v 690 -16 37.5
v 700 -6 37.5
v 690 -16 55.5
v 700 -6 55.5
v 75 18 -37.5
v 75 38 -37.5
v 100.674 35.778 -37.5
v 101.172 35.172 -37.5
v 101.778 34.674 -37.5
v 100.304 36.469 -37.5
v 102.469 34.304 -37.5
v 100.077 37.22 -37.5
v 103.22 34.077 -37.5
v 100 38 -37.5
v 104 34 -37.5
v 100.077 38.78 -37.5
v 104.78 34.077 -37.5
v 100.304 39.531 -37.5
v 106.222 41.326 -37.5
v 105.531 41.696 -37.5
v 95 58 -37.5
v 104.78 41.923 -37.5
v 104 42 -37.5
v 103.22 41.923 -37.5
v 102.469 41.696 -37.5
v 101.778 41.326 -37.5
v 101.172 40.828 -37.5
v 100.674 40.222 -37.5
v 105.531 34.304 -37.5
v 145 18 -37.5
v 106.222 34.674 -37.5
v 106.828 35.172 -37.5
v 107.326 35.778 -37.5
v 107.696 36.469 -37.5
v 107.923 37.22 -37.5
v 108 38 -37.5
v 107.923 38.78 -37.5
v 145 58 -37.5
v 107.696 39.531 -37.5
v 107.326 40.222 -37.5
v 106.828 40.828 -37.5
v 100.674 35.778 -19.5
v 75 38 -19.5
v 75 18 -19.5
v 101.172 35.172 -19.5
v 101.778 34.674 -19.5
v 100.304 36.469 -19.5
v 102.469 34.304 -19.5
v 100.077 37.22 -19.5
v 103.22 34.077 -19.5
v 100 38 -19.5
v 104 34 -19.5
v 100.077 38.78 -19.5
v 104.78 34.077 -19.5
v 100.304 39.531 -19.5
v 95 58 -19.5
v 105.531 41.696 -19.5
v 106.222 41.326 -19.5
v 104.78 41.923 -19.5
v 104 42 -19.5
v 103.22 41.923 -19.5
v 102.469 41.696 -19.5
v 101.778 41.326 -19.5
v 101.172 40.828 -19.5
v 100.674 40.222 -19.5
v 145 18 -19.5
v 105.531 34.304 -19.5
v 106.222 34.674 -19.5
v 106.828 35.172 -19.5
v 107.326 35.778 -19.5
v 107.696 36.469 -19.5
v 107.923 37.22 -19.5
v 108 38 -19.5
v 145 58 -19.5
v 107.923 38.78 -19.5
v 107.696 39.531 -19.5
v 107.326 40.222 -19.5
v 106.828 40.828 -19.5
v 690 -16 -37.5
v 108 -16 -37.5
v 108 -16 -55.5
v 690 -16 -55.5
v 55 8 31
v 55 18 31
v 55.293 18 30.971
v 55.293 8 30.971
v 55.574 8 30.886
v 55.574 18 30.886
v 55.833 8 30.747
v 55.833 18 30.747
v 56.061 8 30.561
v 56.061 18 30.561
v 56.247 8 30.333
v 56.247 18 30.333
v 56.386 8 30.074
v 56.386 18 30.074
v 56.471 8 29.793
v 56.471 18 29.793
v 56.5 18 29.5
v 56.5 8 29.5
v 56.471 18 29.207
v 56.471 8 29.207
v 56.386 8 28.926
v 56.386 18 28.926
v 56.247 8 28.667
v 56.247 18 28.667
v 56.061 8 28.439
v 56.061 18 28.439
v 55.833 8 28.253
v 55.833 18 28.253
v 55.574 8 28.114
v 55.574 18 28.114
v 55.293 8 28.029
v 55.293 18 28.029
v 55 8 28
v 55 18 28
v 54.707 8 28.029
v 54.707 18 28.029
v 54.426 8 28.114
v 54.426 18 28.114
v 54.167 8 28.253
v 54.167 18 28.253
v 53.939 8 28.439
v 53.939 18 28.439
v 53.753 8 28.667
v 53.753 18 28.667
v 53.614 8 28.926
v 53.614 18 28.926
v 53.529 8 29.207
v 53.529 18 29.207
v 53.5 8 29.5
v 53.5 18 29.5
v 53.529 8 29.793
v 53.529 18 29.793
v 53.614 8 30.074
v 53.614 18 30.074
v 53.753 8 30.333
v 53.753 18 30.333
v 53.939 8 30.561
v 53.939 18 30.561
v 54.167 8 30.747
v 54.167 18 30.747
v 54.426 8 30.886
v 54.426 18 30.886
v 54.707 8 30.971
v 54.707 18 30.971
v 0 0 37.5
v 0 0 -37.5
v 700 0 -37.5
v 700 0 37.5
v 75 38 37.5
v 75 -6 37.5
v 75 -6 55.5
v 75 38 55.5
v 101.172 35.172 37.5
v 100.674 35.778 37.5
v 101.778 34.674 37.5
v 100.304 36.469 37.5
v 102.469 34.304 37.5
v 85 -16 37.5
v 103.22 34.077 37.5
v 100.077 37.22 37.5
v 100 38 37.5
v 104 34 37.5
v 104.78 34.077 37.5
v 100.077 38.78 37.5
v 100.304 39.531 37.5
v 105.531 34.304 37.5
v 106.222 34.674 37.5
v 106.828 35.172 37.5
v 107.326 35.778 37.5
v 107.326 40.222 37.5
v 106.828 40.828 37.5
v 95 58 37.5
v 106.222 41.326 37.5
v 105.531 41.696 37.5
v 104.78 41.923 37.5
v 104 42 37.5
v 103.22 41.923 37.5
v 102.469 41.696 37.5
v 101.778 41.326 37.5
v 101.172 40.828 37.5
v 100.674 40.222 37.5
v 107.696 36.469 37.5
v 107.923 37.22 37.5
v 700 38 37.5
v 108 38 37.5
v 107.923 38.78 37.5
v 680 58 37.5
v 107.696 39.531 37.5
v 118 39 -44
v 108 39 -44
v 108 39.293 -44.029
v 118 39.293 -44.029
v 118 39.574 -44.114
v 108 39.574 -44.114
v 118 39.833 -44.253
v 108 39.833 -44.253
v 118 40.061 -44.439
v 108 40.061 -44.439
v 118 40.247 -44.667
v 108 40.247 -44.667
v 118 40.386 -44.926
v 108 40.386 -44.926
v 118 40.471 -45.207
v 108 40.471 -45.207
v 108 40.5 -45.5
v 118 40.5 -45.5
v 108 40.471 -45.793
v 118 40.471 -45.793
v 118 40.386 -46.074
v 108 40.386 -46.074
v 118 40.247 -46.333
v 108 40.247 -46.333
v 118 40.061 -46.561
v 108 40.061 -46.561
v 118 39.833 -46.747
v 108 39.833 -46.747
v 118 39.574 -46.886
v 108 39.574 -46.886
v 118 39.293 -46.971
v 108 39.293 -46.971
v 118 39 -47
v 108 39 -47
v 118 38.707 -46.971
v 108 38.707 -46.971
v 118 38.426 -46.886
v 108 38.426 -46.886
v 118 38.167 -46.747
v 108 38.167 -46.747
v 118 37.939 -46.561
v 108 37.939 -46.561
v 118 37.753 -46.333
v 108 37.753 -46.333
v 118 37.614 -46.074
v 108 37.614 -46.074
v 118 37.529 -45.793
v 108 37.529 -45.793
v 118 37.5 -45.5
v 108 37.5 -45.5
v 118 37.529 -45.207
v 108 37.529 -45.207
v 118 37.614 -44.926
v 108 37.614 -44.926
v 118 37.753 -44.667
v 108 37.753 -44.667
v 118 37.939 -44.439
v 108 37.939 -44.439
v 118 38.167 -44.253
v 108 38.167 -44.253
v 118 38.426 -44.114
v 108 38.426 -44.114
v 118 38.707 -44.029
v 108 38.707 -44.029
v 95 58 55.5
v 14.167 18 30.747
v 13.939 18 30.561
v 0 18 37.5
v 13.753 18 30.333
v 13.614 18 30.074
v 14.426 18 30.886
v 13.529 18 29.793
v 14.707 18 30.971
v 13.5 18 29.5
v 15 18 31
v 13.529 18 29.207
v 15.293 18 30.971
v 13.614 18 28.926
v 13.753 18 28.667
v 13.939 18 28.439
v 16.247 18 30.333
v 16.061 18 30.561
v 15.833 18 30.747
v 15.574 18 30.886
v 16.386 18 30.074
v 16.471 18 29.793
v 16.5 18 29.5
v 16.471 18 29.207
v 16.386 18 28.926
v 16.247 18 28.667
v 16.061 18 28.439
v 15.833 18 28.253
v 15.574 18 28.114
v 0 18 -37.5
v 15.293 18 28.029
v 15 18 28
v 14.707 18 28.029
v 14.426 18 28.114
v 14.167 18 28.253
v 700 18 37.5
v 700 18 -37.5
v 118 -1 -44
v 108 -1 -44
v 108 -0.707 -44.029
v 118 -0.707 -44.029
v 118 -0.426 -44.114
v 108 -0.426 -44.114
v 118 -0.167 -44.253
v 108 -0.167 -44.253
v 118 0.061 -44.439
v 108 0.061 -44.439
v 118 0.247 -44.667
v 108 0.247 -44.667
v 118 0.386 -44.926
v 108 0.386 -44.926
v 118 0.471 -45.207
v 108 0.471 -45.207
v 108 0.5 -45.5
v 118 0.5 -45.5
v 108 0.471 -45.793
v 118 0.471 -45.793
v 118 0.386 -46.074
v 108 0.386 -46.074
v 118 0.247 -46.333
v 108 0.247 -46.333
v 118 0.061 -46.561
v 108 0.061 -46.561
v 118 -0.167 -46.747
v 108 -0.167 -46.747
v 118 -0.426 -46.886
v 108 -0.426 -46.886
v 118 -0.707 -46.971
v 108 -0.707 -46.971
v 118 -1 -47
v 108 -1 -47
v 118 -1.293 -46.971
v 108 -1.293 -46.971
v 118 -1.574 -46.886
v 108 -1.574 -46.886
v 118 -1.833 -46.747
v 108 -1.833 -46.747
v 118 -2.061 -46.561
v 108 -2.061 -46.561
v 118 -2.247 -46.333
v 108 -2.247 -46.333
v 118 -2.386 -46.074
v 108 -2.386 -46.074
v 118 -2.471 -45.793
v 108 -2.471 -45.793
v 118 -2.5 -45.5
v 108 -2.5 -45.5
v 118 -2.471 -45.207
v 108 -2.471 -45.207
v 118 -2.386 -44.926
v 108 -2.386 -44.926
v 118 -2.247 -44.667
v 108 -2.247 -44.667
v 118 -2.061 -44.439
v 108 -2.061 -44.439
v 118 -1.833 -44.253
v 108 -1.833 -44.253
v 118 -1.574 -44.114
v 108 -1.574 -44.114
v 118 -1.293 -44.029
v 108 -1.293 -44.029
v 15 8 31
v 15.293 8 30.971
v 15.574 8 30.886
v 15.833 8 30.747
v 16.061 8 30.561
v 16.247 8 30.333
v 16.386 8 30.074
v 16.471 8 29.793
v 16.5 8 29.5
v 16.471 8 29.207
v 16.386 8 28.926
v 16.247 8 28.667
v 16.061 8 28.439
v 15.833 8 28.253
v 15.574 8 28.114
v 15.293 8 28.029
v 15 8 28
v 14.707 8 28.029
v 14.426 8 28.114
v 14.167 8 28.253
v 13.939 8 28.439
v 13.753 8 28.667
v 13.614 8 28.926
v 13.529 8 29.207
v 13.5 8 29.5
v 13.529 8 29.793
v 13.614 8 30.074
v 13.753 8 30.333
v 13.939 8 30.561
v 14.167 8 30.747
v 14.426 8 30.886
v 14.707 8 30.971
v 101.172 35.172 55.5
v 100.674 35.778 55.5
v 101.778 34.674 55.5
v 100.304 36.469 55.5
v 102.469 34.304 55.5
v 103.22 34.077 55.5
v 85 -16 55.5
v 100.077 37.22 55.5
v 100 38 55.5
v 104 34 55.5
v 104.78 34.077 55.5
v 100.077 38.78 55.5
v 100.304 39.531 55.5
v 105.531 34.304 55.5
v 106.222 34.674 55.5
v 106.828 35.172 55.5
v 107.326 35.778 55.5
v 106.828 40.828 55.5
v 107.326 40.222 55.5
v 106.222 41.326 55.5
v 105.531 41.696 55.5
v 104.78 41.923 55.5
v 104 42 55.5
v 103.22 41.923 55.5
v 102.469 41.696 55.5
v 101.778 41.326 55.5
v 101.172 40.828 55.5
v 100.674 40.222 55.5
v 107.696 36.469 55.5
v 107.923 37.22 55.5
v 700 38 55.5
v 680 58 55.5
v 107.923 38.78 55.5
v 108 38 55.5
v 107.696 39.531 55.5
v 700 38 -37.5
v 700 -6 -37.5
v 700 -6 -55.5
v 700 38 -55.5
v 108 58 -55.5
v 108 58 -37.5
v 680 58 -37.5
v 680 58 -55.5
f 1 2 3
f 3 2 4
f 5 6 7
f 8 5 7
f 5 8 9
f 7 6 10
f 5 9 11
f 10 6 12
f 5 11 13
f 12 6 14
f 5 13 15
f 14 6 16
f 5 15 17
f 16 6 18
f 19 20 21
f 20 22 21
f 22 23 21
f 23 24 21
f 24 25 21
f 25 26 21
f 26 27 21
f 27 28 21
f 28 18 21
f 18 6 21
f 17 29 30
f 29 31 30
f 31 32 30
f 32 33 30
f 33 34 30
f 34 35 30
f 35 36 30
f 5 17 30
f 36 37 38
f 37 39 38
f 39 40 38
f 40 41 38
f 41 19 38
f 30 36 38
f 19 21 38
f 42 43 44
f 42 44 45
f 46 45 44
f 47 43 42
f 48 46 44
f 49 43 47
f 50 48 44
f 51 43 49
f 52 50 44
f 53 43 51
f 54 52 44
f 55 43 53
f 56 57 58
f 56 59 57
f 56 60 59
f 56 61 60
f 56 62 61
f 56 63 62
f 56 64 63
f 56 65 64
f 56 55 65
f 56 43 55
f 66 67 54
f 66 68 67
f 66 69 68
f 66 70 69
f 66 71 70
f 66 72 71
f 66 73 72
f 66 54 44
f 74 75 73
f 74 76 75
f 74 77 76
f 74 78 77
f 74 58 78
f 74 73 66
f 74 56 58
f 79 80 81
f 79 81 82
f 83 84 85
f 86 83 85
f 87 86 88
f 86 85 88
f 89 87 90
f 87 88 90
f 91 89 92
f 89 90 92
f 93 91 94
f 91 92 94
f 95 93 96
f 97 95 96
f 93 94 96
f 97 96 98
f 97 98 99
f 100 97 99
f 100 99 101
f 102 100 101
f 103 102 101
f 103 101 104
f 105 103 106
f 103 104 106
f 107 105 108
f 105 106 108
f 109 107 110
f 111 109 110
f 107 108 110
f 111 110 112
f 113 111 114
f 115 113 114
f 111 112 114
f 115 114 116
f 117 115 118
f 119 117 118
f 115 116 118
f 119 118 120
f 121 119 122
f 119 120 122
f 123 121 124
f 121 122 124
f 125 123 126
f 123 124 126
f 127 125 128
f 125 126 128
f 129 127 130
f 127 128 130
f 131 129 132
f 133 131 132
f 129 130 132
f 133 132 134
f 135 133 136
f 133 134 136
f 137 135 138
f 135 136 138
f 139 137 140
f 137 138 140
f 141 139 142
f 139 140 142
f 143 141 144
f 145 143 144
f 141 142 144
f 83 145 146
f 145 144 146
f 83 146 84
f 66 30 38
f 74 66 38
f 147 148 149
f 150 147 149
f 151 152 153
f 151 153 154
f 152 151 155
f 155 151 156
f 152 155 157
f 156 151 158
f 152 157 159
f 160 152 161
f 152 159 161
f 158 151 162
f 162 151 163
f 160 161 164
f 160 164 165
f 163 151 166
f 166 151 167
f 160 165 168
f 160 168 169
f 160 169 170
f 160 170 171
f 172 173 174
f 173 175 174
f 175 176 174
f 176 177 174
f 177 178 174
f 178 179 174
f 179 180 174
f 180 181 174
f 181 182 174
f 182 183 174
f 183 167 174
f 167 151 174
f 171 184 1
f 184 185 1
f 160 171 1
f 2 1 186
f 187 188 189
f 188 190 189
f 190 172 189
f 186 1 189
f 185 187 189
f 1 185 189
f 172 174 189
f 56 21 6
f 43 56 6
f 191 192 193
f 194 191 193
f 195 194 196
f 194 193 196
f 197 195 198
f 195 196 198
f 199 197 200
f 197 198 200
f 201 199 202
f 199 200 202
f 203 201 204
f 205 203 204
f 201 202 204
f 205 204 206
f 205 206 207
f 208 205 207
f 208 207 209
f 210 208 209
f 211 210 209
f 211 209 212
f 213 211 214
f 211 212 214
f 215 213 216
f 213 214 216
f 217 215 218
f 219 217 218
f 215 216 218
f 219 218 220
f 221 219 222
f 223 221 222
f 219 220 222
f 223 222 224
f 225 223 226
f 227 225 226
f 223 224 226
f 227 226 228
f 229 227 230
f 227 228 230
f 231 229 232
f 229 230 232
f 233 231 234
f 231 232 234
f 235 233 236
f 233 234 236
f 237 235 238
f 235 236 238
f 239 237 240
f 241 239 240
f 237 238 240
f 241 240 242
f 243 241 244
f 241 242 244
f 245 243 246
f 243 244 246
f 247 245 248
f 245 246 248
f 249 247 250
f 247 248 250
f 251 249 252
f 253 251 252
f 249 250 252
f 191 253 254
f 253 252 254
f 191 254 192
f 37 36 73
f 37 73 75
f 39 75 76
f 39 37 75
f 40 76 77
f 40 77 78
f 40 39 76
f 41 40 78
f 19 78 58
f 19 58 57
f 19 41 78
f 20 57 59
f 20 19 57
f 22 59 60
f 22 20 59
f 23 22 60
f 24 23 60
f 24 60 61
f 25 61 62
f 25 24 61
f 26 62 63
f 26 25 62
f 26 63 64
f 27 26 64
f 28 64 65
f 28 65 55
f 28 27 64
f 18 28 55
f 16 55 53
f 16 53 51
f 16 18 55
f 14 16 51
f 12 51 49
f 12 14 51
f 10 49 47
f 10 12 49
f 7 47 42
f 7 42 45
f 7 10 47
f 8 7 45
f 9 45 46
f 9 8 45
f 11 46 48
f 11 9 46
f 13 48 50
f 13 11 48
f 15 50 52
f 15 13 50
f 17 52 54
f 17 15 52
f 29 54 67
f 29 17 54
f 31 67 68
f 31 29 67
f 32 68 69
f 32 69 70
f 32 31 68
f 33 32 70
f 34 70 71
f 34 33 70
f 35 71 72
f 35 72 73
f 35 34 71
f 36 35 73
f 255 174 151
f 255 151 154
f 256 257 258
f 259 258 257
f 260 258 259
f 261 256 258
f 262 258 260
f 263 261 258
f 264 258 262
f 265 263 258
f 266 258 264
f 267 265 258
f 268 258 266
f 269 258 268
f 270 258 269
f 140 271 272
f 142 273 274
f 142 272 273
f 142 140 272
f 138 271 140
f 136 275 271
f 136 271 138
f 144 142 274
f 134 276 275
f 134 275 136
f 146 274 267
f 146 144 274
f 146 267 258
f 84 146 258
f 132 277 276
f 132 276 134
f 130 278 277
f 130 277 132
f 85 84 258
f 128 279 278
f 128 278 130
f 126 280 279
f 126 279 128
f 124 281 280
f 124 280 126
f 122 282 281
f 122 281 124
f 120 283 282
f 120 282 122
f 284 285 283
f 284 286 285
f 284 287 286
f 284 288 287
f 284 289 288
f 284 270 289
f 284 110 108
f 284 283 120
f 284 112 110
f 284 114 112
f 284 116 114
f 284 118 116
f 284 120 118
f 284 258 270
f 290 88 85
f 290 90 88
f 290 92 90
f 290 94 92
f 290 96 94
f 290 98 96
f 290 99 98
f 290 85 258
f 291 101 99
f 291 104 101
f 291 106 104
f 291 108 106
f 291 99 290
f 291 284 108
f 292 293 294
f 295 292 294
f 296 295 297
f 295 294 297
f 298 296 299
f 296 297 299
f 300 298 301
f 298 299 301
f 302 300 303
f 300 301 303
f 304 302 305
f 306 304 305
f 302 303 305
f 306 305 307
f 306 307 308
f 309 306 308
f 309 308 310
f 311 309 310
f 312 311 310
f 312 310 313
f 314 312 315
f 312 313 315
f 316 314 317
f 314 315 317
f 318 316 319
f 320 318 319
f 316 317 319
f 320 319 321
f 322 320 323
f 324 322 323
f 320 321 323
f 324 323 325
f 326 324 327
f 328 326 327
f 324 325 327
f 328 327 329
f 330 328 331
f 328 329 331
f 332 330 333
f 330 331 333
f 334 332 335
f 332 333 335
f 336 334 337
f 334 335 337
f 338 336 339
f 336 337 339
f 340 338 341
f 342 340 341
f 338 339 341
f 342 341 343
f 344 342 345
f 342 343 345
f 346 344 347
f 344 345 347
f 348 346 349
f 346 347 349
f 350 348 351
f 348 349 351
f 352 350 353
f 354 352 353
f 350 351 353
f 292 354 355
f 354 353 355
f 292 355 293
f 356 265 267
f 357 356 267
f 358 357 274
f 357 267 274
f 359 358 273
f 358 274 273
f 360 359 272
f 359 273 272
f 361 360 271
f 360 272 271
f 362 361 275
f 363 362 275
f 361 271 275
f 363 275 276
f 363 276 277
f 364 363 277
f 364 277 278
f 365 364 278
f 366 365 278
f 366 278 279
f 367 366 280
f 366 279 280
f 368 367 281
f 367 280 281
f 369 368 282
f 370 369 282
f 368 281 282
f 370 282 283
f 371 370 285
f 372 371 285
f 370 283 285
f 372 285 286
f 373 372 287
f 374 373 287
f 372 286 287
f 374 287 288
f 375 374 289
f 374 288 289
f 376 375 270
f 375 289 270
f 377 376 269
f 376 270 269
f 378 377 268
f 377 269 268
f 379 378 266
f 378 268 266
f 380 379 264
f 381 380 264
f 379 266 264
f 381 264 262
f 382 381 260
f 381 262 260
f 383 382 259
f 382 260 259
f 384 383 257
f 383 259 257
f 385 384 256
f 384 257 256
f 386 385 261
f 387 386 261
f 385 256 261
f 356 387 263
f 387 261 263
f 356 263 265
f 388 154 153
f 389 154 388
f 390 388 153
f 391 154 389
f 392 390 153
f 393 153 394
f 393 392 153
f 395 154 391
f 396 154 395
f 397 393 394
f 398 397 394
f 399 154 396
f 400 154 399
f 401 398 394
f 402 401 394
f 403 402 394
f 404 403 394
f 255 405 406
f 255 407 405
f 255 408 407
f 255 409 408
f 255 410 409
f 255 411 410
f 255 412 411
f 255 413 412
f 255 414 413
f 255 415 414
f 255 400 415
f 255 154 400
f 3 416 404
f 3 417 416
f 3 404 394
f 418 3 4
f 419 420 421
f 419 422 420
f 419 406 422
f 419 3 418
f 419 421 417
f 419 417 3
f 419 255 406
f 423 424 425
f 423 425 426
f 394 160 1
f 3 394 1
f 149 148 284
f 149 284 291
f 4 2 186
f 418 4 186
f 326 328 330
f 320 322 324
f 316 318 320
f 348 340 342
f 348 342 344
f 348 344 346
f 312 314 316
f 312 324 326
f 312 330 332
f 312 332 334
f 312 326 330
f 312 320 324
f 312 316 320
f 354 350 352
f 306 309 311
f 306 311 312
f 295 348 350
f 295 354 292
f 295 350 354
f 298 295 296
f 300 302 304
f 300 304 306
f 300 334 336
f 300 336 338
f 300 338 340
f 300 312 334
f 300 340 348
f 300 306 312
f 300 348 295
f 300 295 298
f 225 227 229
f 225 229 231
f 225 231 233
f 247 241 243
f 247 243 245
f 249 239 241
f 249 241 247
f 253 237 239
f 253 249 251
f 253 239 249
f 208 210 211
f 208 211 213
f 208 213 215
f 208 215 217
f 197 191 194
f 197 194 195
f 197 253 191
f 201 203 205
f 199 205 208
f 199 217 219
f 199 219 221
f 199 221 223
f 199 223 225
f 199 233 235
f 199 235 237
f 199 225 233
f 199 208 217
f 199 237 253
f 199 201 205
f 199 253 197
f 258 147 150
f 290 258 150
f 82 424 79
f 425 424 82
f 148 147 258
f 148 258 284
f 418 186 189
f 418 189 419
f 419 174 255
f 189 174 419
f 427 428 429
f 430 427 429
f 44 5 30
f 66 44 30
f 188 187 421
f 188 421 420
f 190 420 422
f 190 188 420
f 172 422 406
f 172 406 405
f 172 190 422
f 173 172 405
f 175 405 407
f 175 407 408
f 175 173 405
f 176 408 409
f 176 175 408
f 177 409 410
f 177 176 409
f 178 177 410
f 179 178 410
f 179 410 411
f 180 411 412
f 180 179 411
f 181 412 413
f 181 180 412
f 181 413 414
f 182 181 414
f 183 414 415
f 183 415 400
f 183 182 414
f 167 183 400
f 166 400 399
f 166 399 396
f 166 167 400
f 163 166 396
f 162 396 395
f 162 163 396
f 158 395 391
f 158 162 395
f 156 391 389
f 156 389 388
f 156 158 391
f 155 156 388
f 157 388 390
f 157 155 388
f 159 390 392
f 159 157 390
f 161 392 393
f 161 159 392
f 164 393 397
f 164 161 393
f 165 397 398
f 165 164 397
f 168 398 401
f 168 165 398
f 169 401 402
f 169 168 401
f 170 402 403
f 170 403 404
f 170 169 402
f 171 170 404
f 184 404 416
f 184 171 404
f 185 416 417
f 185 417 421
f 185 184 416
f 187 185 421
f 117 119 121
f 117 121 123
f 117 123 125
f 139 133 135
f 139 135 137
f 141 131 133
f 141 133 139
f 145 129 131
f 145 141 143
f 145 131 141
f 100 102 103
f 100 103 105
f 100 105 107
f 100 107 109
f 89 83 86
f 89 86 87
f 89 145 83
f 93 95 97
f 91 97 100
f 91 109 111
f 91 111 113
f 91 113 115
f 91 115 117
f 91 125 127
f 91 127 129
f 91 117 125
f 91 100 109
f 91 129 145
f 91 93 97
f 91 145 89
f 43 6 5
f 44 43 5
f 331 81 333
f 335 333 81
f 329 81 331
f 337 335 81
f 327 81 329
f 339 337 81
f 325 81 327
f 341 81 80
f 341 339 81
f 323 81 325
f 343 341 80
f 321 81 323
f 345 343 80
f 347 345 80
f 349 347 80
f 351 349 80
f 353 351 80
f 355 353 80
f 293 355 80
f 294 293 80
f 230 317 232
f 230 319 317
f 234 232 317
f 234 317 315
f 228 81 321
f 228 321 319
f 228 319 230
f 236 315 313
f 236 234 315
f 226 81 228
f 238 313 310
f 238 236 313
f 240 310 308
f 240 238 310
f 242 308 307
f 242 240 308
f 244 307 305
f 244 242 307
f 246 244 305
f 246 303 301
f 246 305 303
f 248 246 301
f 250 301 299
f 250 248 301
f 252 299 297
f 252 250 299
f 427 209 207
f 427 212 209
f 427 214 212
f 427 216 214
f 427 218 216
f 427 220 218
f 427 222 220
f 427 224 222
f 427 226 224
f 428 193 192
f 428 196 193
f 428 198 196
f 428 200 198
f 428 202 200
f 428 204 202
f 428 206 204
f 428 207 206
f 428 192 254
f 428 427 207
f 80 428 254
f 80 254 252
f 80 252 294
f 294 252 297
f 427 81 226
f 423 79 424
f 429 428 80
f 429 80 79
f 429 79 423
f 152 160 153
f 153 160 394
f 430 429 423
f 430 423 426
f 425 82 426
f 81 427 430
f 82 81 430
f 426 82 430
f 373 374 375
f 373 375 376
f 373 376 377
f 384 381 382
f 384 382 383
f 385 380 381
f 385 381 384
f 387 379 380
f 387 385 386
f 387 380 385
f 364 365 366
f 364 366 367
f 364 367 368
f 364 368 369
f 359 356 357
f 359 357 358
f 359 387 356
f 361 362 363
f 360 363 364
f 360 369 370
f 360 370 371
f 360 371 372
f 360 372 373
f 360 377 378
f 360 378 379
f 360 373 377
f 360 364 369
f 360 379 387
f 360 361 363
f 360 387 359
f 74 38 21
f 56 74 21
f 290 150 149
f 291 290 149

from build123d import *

# Parameters (mm, degrees)
SKETCH1_W           = 700
SKETCH1_H           = 75
BOSS_EXTRUDE1_DEPTH = 18
SKETCH2_W           = 625
SKETCH2_H           = 74
SKETCH2_R           = 4
BOSS_EXTRUDE2_DEPTH = 18
CHAMFER1_SIZE       = 20
CHAMFER2_SIZE       = 10
SKETCH3_R           = 4
BOSS_EXTRUDE3_DEPTH = 18
SKETCH4_W           = 18
SKETCH4_H           = 74
CUT_EXTRUDE1_DEPTH  = 33
SKETCH5_R           = 1.5
CUT_EXTRUDE2_DEPTH  = 10
SKETCH6_R           = 1.5
CUT_EXTRUDE3_DEPTH  = 10


with BuildPart() as part:
    # Sketch1 → Boss-Extrude1 (new body)
    with BuildSketch(Plane(origin=(0, 0, 0), x_dir=(1, 0, 0), z_dir=(0, 1, 0))):
        with Locations((350, 0)):
            Rectangle(SKETCH1_W, SKETCH1_H)
    extrude(amount=BOSS_EXTRUDE1_DEPTH)

    # Sketch6 → Cut-Extrude3 (cut)
    with BuildSketch(Plane(origin=(0, 18, 0), x_dir=(1, 0, 0), z_dir=(0, 1, 0))):
        with Locations(Location((55, -29.5, 0), (0, 0, 270))):
            Circle(SKETCH6_R)
        with Locations(Location((15, -29.5, 0), (0, 0, 270))):
            Circle(SKETCH6_R)
    extrude(amount=-CUT_EXTRUDE3_DEPTH, mode=Mode.SUBTRACT)


with BuildPart() as body_2:
    # Sketch2 → Boss-Extrude2 (new body)
    with BuildSketch(Plane.XY.offset(37.5)):
        with Locations((387.5, 21)):
            Rectangle(SKETCH2_W, SKETCH2_H)
        with Locations((104, 38)):
            Circle(SKETCH2_R, mode=Mode.SUBTRACT)
    extrude(amount=BOSS_EXTRUDE2_DEPTH)

    # Chamfer1
    chamfer1_edges = [body_2.edges().sort_by_distance(p)[0] for p in [
        (75, 58, 46.5),
        (700, 58, 46.5),
    ]]
    chamfer(chamfer1_edges, length=CHAMFER1_SIZE)

    # Chamfer2
    chamfer2_edges = [body_2.edges().sort_by_distance(p)[0] for p in [
        (700, -16, 46.5),
        (75, -16, 46.5),
    ]]
    chamfer(chamfer2_edges, length=CHAMFER2_SIZE)


with BuildPart() as body_3:
    # Mirror1: mirrored copy
    add(body_2.part.mirror(Plane.XY))

    # Sketch4 → Cut-Extrude1 (cut)
    with BuildSketch(Plane.ZY.offset(-75)):
        with Locations((-46.5, 21)):
            Rectangle(SKETCH4_W, SKETCH4_H)
    extrude(amount=-CUT_EXTRUDE1_DEPTH, mode=Mode.SUBTRACT)

    # Sketch5 → Cut-Extrude2 (cut)
    with BuildSketch(Plane.ZY.offset(-108)):
        with Locations((-45.5, -1)):
            Circle(SKETCH5_R)
        with Locations((-45.5, 39)):
            Circle(SKETCH5_R)
    extrude(amount=-CUT_EXTRUDE2_DEPTH, mode=Mode.SUBTRACT)


with BuildPart() as body_4:
    # Sketch3 → Boss-Extrude3 (new body)
    with BuildSketch(Plane.XY.offset(-37.5)):
        Polygon((75, 38), (75, 18), (145, 18), (145, 58), (95, 58), align=None)
        with Locations((104, 38)):
            Circle(SKETCH3_R, mode=Mode.SUBTRACT)
    extrude(amount=BOSS_EXTRUDE3_DEPTH)


solid = Compound([part.part, body_2.part, body_3.part, body_4.part])
